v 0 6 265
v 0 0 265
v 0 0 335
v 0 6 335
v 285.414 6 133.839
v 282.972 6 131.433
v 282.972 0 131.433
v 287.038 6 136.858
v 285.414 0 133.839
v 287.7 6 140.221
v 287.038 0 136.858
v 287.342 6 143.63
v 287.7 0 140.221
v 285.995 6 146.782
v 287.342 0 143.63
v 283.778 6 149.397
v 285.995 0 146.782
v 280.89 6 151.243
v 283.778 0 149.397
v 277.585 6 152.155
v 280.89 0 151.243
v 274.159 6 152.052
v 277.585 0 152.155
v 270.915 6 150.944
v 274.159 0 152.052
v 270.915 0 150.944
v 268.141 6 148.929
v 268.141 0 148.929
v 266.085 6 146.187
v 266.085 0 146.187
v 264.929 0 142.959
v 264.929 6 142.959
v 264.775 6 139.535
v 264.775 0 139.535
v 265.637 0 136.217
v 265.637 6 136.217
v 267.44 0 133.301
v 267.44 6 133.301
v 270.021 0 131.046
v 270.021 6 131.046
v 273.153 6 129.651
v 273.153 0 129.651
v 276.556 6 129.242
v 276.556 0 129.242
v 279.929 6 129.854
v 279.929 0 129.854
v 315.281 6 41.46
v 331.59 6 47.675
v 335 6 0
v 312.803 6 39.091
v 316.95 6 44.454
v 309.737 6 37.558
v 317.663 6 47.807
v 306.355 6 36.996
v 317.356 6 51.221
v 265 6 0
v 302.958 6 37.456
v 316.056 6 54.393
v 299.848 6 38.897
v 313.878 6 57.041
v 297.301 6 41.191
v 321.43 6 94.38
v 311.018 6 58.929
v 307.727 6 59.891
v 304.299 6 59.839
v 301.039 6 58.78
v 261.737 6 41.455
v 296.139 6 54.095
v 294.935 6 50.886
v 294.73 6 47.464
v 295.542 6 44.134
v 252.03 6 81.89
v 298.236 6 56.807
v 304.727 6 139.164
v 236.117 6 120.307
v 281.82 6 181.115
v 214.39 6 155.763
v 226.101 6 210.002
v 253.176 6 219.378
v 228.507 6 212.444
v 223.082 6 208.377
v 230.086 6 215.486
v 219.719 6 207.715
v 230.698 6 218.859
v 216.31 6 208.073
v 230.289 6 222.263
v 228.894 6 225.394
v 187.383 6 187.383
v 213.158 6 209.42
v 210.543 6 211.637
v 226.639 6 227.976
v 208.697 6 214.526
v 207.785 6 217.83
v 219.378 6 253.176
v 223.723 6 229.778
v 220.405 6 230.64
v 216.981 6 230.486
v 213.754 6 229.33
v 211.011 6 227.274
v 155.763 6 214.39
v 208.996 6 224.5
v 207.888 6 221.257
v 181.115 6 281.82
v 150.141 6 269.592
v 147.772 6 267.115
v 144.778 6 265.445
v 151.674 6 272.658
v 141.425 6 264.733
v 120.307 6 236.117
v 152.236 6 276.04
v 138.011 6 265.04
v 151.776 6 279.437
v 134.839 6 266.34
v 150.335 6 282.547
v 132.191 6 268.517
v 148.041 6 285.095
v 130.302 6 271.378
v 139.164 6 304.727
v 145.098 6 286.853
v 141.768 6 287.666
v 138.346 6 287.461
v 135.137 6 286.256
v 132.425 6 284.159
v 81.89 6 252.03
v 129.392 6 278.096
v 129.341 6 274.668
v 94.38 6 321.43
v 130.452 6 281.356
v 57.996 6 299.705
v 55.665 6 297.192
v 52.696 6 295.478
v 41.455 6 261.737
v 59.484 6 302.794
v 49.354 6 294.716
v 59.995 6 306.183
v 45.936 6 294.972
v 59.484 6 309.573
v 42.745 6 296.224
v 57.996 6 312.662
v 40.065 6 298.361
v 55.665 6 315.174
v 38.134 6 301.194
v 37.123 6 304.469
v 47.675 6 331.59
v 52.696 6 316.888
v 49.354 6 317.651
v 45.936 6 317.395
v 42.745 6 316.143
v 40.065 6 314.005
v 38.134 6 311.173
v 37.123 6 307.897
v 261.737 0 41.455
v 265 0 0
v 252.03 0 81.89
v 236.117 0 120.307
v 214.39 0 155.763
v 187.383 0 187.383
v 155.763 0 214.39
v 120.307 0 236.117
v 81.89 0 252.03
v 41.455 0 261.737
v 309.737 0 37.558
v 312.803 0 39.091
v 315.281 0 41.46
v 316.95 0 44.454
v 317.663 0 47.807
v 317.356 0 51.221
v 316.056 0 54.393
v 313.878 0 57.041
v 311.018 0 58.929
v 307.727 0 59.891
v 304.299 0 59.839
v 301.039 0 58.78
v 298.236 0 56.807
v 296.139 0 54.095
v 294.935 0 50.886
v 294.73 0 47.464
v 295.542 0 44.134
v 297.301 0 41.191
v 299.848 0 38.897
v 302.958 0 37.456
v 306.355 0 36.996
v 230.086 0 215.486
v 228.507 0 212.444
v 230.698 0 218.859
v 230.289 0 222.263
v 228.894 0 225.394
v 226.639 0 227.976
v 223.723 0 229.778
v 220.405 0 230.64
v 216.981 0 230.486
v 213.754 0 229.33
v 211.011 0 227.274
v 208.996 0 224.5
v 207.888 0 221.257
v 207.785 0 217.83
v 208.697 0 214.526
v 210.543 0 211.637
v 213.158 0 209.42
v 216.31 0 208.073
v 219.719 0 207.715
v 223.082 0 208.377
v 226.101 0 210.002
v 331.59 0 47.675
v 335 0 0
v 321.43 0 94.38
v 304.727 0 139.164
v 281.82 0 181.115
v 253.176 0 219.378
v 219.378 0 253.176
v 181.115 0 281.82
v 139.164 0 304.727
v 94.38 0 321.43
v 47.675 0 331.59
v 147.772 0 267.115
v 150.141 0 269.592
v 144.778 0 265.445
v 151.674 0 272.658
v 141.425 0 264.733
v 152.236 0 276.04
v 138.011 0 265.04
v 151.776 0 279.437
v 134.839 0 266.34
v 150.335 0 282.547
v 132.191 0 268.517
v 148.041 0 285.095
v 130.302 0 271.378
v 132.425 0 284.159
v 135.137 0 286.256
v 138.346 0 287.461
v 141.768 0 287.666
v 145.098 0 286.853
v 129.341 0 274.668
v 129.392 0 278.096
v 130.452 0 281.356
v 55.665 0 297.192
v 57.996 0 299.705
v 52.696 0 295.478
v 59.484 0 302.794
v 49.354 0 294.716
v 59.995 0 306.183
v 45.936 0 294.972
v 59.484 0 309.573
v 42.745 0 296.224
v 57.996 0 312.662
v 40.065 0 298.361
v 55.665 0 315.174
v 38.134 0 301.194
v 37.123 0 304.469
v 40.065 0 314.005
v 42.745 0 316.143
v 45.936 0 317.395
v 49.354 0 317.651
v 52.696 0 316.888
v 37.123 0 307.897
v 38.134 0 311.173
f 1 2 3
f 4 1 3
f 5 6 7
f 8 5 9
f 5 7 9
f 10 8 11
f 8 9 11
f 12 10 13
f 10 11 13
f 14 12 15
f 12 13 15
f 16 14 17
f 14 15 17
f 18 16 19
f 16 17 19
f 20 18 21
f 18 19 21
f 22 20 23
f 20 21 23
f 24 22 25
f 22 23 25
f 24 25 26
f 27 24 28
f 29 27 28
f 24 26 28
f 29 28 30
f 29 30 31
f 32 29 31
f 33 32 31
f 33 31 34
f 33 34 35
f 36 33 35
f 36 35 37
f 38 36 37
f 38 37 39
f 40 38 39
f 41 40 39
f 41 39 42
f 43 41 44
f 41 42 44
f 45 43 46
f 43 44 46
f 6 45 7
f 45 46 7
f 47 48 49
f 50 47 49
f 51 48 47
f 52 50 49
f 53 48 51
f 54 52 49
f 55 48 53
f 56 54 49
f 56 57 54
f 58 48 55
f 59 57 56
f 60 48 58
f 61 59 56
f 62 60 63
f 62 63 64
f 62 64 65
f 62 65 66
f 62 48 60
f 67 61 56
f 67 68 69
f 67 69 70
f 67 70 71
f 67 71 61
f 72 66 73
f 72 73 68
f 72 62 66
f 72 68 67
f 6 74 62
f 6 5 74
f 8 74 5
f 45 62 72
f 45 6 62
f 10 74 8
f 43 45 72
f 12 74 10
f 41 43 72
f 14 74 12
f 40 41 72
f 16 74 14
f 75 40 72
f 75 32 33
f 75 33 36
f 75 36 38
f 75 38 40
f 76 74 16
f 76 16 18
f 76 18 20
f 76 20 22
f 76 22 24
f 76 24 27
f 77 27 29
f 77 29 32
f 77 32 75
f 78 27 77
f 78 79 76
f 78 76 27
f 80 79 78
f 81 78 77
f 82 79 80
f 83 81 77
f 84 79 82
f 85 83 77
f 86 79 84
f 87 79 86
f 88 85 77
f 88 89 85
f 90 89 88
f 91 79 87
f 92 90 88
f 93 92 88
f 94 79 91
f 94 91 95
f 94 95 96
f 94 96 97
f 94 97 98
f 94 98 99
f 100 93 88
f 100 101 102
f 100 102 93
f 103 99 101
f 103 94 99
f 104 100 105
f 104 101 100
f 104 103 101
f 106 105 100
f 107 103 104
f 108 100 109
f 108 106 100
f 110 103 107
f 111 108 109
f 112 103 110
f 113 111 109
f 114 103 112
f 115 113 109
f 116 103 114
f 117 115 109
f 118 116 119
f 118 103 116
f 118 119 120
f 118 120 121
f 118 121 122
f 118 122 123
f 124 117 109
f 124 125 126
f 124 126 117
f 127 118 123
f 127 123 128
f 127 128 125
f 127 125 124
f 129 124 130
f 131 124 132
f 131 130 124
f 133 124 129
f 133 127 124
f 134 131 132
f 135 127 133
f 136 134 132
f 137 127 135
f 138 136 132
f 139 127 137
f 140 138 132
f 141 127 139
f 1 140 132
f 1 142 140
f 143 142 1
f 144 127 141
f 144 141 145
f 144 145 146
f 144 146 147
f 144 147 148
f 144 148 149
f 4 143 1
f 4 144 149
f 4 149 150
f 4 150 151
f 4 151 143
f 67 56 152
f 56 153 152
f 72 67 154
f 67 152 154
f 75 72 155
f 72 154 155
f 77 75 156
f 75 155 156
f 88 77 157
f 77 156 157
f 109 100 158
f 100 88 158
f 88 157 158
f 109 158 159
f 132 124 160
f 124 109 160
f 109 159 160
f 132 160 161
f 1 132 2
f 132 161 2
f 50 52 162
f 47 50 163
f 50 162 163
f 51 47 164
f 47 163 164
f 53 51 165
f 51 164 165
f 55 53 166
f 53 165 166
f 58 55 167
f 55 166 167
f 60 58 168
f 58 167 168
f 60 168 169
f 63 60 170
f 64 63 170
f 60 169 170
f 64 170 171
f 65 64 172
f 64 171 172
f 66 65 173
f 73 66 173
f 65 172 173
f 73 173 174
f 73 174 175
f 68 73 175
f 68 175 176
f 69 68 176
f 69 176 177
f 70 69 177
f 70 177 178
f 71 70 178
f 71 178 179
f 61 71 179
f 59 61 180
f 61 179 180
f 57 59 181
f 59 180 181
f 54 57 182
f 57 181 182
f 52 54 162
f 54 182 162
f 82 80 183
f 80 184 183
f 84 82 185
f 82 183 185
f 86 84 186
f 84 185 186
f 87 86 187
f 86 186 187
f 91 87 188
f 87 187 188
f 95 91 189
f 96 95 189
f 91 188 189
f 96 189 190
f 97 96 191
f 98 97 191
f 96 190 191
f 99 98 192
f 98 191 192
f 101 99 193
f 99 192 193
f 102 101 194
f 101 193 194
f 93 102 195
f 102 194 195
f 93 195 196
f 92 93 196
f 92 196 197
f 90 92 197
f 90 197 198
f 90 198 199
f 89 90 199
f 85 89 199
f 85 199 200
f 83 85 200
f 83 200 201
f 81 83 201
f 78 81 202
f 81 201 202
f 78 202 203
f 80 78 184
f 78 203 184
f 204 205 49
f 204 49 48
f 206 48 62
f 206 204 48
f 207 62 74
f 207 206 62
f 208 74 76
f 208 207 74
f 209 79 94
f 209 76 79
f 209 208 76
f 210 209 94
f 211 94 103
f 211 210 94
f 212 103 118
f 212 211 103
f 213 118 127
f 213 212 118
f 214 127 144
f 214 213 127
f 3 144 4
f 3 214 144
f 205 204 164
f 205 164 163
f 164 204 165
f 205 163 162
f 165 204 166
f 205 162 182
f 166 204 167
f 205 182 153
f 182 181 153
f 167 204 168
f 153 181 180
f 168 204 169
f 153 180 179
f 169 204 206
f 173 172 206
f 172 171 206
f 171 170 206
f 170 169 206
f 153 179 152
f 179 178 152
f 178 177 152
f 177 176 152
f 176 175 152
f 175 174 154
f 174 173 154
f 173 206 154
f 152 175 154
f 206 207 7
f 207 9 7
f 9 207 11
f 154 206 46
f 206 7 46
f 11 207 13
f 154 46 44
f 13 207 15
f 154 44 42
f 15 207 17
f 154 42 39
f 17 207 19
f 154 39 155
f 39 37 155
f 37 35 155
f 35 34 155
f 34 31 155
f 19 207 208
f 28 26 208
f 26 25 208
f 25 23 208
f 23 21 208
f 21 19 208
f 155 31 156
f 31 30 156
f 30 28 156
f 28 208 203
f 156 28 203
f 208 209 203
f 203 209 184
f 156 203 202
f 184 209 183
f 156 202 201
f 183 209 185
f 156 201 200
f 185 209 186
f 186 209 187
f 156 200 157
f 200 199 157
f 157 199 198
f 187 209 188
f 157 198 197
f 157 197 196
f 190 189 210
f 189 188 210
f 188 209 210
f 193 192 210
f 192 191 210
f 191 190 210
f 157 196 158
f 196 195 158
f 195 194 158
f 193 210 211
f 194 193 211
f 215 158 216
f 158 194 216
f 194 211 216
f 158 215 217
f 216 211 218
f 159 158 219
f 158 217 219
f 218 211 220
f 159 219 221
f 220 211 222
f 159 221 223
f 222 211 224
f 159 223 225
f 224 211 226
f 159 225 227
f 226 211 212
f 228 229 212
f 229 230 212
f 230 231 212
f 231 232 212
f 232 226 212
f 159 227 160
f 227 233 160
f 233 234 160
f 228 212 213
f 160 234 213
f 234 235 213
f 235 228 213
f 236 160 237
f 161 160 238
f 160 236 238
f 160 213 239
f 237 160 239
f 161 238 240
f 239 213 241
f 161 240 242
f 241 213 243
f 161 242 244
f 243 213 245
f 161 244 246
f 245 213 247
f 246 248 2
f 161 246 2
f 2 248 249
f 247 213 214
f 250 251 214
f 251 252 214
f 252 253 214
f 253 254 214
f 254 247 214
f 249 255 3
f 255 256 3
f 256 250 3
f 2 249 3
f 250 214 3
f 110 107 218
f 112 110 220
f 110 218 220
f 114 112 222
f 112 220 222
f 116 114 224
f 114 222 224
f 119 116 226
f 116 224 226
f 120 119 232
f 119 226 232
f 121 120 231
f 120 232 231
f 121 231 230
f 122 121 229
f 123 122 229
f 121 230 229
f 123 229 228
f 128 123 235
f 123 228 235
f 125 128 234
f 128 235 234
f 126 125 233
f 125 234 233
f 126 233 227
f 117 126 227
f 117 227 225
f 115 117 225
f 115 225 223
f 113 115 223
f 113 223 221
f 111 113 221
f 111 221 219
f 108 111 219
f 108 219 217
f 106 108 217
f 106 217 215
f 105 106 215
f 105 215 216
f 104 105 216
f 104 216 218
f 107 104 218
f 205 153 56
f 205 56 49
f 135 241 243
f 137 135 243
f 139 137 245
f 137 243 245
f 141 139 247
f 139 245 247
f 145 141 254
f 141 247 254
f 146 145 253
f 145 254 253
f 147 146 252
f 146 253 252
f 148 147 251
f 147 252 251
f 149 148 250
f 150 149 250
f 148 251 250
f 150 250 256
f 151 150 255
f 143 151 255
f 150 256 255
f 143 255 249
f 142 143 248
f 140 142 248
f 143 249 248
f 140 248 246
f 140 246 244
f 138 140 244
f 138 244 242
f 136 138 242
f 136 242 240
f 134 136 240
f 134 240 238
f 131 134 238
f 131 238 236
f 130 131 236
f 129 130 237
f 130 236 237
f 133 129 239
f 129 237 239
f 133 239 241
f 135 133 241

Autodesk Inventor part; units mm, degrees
ref_plane "YZ Plane" through (0, 0, 0) normal (1, 0, 0) x (0, 1, 0)
ref_plane "XZ Plane" through (0, 0, 0) normal (0, 1, 0) x (-1, 0, 0)
ref_plane "XY Plane" through (0, 0, 0) normal (0, 0, 1) x (1, 0, 0)
sketch "Sketch1" plane through (0, 0, 0) normal (0, 1, 0) x (-1, 0, 0)
  circle A0 centre (0, 0) radius 265
  circle A1 centre (0, 0) radius 335
  line L0 (335, 0) -> (265, 0)
  line L1 (-265, 0) -> (-335, 0)
  line L2 (0, 265) -> (0, 335)
  point P0 (300, 0)
  point P1 (-300, 0)
  point P2 (0, 300)
  dimension "d1" = 670
  dimension "d4" = 530
extrude "Extrusion1" add sketch "Sketch1" along normal blind 6 contours A0 L1 A1 L2
sketch "Sketch2" plane through (0, 0, 0) normal (0, -1, 0) x (1, 0, 0)
  arc A0 (335, 0) -> (0, 335) centre (0, 0) ccw projected
  line L0 (0, 265) -> (0, 335) projected
  arc A1 (265, 0) -> (0, 265) centre (0, 0) ccw projected
  line L1 (335, 0) -> (265, 0) projected
  circle A2 centre (48.4947, 306.1834) radius 11.5
  arc A3 (265, 0) -> (0, 265) centre (0, 0) ccw projected
  line L2 (48.4947, 306.1834) -> (0, 0)
  dimension "d5" = 310
  dimension "d6" = 9
  dimension "d7" = 23
extrude "Cut1" cut sketch "Sketch2" against normal blind 6 contours A2
pattern_circular "Circular Pattern1" count 20 over 360 about axis through (0, 0, 0) along (0, 1, 0) of "Cut1"
equation "\"d4\" = Accsess_hatch_diameter"
equation "\"d9\" = Thickness"
equation "\"BendRadius\" = Thickness"
equation "\"BendReliefWidth\" = Thickness"
equation "\"BendReliefDepth\" = 0.5 * Thickness"
equation "\"CornerReliefSize\" = 4 * Thickness"
equation "\"MinimumRemnant\" = 2 * Thickness"
equation "\"TransitionRadius\" = BendRadius"
equation "\"JacobiRadiusSize\" = BendRadius"
equation "\"GapSize\" = Thickness"
equation "\"d8\" = Thickness"
equation "\"Accsess_hatch_diameter\" = 530"
equation "\"Thickness\" = 6"
properties part number "PNS-712 accses hatch flangeipt" material "Steel"
